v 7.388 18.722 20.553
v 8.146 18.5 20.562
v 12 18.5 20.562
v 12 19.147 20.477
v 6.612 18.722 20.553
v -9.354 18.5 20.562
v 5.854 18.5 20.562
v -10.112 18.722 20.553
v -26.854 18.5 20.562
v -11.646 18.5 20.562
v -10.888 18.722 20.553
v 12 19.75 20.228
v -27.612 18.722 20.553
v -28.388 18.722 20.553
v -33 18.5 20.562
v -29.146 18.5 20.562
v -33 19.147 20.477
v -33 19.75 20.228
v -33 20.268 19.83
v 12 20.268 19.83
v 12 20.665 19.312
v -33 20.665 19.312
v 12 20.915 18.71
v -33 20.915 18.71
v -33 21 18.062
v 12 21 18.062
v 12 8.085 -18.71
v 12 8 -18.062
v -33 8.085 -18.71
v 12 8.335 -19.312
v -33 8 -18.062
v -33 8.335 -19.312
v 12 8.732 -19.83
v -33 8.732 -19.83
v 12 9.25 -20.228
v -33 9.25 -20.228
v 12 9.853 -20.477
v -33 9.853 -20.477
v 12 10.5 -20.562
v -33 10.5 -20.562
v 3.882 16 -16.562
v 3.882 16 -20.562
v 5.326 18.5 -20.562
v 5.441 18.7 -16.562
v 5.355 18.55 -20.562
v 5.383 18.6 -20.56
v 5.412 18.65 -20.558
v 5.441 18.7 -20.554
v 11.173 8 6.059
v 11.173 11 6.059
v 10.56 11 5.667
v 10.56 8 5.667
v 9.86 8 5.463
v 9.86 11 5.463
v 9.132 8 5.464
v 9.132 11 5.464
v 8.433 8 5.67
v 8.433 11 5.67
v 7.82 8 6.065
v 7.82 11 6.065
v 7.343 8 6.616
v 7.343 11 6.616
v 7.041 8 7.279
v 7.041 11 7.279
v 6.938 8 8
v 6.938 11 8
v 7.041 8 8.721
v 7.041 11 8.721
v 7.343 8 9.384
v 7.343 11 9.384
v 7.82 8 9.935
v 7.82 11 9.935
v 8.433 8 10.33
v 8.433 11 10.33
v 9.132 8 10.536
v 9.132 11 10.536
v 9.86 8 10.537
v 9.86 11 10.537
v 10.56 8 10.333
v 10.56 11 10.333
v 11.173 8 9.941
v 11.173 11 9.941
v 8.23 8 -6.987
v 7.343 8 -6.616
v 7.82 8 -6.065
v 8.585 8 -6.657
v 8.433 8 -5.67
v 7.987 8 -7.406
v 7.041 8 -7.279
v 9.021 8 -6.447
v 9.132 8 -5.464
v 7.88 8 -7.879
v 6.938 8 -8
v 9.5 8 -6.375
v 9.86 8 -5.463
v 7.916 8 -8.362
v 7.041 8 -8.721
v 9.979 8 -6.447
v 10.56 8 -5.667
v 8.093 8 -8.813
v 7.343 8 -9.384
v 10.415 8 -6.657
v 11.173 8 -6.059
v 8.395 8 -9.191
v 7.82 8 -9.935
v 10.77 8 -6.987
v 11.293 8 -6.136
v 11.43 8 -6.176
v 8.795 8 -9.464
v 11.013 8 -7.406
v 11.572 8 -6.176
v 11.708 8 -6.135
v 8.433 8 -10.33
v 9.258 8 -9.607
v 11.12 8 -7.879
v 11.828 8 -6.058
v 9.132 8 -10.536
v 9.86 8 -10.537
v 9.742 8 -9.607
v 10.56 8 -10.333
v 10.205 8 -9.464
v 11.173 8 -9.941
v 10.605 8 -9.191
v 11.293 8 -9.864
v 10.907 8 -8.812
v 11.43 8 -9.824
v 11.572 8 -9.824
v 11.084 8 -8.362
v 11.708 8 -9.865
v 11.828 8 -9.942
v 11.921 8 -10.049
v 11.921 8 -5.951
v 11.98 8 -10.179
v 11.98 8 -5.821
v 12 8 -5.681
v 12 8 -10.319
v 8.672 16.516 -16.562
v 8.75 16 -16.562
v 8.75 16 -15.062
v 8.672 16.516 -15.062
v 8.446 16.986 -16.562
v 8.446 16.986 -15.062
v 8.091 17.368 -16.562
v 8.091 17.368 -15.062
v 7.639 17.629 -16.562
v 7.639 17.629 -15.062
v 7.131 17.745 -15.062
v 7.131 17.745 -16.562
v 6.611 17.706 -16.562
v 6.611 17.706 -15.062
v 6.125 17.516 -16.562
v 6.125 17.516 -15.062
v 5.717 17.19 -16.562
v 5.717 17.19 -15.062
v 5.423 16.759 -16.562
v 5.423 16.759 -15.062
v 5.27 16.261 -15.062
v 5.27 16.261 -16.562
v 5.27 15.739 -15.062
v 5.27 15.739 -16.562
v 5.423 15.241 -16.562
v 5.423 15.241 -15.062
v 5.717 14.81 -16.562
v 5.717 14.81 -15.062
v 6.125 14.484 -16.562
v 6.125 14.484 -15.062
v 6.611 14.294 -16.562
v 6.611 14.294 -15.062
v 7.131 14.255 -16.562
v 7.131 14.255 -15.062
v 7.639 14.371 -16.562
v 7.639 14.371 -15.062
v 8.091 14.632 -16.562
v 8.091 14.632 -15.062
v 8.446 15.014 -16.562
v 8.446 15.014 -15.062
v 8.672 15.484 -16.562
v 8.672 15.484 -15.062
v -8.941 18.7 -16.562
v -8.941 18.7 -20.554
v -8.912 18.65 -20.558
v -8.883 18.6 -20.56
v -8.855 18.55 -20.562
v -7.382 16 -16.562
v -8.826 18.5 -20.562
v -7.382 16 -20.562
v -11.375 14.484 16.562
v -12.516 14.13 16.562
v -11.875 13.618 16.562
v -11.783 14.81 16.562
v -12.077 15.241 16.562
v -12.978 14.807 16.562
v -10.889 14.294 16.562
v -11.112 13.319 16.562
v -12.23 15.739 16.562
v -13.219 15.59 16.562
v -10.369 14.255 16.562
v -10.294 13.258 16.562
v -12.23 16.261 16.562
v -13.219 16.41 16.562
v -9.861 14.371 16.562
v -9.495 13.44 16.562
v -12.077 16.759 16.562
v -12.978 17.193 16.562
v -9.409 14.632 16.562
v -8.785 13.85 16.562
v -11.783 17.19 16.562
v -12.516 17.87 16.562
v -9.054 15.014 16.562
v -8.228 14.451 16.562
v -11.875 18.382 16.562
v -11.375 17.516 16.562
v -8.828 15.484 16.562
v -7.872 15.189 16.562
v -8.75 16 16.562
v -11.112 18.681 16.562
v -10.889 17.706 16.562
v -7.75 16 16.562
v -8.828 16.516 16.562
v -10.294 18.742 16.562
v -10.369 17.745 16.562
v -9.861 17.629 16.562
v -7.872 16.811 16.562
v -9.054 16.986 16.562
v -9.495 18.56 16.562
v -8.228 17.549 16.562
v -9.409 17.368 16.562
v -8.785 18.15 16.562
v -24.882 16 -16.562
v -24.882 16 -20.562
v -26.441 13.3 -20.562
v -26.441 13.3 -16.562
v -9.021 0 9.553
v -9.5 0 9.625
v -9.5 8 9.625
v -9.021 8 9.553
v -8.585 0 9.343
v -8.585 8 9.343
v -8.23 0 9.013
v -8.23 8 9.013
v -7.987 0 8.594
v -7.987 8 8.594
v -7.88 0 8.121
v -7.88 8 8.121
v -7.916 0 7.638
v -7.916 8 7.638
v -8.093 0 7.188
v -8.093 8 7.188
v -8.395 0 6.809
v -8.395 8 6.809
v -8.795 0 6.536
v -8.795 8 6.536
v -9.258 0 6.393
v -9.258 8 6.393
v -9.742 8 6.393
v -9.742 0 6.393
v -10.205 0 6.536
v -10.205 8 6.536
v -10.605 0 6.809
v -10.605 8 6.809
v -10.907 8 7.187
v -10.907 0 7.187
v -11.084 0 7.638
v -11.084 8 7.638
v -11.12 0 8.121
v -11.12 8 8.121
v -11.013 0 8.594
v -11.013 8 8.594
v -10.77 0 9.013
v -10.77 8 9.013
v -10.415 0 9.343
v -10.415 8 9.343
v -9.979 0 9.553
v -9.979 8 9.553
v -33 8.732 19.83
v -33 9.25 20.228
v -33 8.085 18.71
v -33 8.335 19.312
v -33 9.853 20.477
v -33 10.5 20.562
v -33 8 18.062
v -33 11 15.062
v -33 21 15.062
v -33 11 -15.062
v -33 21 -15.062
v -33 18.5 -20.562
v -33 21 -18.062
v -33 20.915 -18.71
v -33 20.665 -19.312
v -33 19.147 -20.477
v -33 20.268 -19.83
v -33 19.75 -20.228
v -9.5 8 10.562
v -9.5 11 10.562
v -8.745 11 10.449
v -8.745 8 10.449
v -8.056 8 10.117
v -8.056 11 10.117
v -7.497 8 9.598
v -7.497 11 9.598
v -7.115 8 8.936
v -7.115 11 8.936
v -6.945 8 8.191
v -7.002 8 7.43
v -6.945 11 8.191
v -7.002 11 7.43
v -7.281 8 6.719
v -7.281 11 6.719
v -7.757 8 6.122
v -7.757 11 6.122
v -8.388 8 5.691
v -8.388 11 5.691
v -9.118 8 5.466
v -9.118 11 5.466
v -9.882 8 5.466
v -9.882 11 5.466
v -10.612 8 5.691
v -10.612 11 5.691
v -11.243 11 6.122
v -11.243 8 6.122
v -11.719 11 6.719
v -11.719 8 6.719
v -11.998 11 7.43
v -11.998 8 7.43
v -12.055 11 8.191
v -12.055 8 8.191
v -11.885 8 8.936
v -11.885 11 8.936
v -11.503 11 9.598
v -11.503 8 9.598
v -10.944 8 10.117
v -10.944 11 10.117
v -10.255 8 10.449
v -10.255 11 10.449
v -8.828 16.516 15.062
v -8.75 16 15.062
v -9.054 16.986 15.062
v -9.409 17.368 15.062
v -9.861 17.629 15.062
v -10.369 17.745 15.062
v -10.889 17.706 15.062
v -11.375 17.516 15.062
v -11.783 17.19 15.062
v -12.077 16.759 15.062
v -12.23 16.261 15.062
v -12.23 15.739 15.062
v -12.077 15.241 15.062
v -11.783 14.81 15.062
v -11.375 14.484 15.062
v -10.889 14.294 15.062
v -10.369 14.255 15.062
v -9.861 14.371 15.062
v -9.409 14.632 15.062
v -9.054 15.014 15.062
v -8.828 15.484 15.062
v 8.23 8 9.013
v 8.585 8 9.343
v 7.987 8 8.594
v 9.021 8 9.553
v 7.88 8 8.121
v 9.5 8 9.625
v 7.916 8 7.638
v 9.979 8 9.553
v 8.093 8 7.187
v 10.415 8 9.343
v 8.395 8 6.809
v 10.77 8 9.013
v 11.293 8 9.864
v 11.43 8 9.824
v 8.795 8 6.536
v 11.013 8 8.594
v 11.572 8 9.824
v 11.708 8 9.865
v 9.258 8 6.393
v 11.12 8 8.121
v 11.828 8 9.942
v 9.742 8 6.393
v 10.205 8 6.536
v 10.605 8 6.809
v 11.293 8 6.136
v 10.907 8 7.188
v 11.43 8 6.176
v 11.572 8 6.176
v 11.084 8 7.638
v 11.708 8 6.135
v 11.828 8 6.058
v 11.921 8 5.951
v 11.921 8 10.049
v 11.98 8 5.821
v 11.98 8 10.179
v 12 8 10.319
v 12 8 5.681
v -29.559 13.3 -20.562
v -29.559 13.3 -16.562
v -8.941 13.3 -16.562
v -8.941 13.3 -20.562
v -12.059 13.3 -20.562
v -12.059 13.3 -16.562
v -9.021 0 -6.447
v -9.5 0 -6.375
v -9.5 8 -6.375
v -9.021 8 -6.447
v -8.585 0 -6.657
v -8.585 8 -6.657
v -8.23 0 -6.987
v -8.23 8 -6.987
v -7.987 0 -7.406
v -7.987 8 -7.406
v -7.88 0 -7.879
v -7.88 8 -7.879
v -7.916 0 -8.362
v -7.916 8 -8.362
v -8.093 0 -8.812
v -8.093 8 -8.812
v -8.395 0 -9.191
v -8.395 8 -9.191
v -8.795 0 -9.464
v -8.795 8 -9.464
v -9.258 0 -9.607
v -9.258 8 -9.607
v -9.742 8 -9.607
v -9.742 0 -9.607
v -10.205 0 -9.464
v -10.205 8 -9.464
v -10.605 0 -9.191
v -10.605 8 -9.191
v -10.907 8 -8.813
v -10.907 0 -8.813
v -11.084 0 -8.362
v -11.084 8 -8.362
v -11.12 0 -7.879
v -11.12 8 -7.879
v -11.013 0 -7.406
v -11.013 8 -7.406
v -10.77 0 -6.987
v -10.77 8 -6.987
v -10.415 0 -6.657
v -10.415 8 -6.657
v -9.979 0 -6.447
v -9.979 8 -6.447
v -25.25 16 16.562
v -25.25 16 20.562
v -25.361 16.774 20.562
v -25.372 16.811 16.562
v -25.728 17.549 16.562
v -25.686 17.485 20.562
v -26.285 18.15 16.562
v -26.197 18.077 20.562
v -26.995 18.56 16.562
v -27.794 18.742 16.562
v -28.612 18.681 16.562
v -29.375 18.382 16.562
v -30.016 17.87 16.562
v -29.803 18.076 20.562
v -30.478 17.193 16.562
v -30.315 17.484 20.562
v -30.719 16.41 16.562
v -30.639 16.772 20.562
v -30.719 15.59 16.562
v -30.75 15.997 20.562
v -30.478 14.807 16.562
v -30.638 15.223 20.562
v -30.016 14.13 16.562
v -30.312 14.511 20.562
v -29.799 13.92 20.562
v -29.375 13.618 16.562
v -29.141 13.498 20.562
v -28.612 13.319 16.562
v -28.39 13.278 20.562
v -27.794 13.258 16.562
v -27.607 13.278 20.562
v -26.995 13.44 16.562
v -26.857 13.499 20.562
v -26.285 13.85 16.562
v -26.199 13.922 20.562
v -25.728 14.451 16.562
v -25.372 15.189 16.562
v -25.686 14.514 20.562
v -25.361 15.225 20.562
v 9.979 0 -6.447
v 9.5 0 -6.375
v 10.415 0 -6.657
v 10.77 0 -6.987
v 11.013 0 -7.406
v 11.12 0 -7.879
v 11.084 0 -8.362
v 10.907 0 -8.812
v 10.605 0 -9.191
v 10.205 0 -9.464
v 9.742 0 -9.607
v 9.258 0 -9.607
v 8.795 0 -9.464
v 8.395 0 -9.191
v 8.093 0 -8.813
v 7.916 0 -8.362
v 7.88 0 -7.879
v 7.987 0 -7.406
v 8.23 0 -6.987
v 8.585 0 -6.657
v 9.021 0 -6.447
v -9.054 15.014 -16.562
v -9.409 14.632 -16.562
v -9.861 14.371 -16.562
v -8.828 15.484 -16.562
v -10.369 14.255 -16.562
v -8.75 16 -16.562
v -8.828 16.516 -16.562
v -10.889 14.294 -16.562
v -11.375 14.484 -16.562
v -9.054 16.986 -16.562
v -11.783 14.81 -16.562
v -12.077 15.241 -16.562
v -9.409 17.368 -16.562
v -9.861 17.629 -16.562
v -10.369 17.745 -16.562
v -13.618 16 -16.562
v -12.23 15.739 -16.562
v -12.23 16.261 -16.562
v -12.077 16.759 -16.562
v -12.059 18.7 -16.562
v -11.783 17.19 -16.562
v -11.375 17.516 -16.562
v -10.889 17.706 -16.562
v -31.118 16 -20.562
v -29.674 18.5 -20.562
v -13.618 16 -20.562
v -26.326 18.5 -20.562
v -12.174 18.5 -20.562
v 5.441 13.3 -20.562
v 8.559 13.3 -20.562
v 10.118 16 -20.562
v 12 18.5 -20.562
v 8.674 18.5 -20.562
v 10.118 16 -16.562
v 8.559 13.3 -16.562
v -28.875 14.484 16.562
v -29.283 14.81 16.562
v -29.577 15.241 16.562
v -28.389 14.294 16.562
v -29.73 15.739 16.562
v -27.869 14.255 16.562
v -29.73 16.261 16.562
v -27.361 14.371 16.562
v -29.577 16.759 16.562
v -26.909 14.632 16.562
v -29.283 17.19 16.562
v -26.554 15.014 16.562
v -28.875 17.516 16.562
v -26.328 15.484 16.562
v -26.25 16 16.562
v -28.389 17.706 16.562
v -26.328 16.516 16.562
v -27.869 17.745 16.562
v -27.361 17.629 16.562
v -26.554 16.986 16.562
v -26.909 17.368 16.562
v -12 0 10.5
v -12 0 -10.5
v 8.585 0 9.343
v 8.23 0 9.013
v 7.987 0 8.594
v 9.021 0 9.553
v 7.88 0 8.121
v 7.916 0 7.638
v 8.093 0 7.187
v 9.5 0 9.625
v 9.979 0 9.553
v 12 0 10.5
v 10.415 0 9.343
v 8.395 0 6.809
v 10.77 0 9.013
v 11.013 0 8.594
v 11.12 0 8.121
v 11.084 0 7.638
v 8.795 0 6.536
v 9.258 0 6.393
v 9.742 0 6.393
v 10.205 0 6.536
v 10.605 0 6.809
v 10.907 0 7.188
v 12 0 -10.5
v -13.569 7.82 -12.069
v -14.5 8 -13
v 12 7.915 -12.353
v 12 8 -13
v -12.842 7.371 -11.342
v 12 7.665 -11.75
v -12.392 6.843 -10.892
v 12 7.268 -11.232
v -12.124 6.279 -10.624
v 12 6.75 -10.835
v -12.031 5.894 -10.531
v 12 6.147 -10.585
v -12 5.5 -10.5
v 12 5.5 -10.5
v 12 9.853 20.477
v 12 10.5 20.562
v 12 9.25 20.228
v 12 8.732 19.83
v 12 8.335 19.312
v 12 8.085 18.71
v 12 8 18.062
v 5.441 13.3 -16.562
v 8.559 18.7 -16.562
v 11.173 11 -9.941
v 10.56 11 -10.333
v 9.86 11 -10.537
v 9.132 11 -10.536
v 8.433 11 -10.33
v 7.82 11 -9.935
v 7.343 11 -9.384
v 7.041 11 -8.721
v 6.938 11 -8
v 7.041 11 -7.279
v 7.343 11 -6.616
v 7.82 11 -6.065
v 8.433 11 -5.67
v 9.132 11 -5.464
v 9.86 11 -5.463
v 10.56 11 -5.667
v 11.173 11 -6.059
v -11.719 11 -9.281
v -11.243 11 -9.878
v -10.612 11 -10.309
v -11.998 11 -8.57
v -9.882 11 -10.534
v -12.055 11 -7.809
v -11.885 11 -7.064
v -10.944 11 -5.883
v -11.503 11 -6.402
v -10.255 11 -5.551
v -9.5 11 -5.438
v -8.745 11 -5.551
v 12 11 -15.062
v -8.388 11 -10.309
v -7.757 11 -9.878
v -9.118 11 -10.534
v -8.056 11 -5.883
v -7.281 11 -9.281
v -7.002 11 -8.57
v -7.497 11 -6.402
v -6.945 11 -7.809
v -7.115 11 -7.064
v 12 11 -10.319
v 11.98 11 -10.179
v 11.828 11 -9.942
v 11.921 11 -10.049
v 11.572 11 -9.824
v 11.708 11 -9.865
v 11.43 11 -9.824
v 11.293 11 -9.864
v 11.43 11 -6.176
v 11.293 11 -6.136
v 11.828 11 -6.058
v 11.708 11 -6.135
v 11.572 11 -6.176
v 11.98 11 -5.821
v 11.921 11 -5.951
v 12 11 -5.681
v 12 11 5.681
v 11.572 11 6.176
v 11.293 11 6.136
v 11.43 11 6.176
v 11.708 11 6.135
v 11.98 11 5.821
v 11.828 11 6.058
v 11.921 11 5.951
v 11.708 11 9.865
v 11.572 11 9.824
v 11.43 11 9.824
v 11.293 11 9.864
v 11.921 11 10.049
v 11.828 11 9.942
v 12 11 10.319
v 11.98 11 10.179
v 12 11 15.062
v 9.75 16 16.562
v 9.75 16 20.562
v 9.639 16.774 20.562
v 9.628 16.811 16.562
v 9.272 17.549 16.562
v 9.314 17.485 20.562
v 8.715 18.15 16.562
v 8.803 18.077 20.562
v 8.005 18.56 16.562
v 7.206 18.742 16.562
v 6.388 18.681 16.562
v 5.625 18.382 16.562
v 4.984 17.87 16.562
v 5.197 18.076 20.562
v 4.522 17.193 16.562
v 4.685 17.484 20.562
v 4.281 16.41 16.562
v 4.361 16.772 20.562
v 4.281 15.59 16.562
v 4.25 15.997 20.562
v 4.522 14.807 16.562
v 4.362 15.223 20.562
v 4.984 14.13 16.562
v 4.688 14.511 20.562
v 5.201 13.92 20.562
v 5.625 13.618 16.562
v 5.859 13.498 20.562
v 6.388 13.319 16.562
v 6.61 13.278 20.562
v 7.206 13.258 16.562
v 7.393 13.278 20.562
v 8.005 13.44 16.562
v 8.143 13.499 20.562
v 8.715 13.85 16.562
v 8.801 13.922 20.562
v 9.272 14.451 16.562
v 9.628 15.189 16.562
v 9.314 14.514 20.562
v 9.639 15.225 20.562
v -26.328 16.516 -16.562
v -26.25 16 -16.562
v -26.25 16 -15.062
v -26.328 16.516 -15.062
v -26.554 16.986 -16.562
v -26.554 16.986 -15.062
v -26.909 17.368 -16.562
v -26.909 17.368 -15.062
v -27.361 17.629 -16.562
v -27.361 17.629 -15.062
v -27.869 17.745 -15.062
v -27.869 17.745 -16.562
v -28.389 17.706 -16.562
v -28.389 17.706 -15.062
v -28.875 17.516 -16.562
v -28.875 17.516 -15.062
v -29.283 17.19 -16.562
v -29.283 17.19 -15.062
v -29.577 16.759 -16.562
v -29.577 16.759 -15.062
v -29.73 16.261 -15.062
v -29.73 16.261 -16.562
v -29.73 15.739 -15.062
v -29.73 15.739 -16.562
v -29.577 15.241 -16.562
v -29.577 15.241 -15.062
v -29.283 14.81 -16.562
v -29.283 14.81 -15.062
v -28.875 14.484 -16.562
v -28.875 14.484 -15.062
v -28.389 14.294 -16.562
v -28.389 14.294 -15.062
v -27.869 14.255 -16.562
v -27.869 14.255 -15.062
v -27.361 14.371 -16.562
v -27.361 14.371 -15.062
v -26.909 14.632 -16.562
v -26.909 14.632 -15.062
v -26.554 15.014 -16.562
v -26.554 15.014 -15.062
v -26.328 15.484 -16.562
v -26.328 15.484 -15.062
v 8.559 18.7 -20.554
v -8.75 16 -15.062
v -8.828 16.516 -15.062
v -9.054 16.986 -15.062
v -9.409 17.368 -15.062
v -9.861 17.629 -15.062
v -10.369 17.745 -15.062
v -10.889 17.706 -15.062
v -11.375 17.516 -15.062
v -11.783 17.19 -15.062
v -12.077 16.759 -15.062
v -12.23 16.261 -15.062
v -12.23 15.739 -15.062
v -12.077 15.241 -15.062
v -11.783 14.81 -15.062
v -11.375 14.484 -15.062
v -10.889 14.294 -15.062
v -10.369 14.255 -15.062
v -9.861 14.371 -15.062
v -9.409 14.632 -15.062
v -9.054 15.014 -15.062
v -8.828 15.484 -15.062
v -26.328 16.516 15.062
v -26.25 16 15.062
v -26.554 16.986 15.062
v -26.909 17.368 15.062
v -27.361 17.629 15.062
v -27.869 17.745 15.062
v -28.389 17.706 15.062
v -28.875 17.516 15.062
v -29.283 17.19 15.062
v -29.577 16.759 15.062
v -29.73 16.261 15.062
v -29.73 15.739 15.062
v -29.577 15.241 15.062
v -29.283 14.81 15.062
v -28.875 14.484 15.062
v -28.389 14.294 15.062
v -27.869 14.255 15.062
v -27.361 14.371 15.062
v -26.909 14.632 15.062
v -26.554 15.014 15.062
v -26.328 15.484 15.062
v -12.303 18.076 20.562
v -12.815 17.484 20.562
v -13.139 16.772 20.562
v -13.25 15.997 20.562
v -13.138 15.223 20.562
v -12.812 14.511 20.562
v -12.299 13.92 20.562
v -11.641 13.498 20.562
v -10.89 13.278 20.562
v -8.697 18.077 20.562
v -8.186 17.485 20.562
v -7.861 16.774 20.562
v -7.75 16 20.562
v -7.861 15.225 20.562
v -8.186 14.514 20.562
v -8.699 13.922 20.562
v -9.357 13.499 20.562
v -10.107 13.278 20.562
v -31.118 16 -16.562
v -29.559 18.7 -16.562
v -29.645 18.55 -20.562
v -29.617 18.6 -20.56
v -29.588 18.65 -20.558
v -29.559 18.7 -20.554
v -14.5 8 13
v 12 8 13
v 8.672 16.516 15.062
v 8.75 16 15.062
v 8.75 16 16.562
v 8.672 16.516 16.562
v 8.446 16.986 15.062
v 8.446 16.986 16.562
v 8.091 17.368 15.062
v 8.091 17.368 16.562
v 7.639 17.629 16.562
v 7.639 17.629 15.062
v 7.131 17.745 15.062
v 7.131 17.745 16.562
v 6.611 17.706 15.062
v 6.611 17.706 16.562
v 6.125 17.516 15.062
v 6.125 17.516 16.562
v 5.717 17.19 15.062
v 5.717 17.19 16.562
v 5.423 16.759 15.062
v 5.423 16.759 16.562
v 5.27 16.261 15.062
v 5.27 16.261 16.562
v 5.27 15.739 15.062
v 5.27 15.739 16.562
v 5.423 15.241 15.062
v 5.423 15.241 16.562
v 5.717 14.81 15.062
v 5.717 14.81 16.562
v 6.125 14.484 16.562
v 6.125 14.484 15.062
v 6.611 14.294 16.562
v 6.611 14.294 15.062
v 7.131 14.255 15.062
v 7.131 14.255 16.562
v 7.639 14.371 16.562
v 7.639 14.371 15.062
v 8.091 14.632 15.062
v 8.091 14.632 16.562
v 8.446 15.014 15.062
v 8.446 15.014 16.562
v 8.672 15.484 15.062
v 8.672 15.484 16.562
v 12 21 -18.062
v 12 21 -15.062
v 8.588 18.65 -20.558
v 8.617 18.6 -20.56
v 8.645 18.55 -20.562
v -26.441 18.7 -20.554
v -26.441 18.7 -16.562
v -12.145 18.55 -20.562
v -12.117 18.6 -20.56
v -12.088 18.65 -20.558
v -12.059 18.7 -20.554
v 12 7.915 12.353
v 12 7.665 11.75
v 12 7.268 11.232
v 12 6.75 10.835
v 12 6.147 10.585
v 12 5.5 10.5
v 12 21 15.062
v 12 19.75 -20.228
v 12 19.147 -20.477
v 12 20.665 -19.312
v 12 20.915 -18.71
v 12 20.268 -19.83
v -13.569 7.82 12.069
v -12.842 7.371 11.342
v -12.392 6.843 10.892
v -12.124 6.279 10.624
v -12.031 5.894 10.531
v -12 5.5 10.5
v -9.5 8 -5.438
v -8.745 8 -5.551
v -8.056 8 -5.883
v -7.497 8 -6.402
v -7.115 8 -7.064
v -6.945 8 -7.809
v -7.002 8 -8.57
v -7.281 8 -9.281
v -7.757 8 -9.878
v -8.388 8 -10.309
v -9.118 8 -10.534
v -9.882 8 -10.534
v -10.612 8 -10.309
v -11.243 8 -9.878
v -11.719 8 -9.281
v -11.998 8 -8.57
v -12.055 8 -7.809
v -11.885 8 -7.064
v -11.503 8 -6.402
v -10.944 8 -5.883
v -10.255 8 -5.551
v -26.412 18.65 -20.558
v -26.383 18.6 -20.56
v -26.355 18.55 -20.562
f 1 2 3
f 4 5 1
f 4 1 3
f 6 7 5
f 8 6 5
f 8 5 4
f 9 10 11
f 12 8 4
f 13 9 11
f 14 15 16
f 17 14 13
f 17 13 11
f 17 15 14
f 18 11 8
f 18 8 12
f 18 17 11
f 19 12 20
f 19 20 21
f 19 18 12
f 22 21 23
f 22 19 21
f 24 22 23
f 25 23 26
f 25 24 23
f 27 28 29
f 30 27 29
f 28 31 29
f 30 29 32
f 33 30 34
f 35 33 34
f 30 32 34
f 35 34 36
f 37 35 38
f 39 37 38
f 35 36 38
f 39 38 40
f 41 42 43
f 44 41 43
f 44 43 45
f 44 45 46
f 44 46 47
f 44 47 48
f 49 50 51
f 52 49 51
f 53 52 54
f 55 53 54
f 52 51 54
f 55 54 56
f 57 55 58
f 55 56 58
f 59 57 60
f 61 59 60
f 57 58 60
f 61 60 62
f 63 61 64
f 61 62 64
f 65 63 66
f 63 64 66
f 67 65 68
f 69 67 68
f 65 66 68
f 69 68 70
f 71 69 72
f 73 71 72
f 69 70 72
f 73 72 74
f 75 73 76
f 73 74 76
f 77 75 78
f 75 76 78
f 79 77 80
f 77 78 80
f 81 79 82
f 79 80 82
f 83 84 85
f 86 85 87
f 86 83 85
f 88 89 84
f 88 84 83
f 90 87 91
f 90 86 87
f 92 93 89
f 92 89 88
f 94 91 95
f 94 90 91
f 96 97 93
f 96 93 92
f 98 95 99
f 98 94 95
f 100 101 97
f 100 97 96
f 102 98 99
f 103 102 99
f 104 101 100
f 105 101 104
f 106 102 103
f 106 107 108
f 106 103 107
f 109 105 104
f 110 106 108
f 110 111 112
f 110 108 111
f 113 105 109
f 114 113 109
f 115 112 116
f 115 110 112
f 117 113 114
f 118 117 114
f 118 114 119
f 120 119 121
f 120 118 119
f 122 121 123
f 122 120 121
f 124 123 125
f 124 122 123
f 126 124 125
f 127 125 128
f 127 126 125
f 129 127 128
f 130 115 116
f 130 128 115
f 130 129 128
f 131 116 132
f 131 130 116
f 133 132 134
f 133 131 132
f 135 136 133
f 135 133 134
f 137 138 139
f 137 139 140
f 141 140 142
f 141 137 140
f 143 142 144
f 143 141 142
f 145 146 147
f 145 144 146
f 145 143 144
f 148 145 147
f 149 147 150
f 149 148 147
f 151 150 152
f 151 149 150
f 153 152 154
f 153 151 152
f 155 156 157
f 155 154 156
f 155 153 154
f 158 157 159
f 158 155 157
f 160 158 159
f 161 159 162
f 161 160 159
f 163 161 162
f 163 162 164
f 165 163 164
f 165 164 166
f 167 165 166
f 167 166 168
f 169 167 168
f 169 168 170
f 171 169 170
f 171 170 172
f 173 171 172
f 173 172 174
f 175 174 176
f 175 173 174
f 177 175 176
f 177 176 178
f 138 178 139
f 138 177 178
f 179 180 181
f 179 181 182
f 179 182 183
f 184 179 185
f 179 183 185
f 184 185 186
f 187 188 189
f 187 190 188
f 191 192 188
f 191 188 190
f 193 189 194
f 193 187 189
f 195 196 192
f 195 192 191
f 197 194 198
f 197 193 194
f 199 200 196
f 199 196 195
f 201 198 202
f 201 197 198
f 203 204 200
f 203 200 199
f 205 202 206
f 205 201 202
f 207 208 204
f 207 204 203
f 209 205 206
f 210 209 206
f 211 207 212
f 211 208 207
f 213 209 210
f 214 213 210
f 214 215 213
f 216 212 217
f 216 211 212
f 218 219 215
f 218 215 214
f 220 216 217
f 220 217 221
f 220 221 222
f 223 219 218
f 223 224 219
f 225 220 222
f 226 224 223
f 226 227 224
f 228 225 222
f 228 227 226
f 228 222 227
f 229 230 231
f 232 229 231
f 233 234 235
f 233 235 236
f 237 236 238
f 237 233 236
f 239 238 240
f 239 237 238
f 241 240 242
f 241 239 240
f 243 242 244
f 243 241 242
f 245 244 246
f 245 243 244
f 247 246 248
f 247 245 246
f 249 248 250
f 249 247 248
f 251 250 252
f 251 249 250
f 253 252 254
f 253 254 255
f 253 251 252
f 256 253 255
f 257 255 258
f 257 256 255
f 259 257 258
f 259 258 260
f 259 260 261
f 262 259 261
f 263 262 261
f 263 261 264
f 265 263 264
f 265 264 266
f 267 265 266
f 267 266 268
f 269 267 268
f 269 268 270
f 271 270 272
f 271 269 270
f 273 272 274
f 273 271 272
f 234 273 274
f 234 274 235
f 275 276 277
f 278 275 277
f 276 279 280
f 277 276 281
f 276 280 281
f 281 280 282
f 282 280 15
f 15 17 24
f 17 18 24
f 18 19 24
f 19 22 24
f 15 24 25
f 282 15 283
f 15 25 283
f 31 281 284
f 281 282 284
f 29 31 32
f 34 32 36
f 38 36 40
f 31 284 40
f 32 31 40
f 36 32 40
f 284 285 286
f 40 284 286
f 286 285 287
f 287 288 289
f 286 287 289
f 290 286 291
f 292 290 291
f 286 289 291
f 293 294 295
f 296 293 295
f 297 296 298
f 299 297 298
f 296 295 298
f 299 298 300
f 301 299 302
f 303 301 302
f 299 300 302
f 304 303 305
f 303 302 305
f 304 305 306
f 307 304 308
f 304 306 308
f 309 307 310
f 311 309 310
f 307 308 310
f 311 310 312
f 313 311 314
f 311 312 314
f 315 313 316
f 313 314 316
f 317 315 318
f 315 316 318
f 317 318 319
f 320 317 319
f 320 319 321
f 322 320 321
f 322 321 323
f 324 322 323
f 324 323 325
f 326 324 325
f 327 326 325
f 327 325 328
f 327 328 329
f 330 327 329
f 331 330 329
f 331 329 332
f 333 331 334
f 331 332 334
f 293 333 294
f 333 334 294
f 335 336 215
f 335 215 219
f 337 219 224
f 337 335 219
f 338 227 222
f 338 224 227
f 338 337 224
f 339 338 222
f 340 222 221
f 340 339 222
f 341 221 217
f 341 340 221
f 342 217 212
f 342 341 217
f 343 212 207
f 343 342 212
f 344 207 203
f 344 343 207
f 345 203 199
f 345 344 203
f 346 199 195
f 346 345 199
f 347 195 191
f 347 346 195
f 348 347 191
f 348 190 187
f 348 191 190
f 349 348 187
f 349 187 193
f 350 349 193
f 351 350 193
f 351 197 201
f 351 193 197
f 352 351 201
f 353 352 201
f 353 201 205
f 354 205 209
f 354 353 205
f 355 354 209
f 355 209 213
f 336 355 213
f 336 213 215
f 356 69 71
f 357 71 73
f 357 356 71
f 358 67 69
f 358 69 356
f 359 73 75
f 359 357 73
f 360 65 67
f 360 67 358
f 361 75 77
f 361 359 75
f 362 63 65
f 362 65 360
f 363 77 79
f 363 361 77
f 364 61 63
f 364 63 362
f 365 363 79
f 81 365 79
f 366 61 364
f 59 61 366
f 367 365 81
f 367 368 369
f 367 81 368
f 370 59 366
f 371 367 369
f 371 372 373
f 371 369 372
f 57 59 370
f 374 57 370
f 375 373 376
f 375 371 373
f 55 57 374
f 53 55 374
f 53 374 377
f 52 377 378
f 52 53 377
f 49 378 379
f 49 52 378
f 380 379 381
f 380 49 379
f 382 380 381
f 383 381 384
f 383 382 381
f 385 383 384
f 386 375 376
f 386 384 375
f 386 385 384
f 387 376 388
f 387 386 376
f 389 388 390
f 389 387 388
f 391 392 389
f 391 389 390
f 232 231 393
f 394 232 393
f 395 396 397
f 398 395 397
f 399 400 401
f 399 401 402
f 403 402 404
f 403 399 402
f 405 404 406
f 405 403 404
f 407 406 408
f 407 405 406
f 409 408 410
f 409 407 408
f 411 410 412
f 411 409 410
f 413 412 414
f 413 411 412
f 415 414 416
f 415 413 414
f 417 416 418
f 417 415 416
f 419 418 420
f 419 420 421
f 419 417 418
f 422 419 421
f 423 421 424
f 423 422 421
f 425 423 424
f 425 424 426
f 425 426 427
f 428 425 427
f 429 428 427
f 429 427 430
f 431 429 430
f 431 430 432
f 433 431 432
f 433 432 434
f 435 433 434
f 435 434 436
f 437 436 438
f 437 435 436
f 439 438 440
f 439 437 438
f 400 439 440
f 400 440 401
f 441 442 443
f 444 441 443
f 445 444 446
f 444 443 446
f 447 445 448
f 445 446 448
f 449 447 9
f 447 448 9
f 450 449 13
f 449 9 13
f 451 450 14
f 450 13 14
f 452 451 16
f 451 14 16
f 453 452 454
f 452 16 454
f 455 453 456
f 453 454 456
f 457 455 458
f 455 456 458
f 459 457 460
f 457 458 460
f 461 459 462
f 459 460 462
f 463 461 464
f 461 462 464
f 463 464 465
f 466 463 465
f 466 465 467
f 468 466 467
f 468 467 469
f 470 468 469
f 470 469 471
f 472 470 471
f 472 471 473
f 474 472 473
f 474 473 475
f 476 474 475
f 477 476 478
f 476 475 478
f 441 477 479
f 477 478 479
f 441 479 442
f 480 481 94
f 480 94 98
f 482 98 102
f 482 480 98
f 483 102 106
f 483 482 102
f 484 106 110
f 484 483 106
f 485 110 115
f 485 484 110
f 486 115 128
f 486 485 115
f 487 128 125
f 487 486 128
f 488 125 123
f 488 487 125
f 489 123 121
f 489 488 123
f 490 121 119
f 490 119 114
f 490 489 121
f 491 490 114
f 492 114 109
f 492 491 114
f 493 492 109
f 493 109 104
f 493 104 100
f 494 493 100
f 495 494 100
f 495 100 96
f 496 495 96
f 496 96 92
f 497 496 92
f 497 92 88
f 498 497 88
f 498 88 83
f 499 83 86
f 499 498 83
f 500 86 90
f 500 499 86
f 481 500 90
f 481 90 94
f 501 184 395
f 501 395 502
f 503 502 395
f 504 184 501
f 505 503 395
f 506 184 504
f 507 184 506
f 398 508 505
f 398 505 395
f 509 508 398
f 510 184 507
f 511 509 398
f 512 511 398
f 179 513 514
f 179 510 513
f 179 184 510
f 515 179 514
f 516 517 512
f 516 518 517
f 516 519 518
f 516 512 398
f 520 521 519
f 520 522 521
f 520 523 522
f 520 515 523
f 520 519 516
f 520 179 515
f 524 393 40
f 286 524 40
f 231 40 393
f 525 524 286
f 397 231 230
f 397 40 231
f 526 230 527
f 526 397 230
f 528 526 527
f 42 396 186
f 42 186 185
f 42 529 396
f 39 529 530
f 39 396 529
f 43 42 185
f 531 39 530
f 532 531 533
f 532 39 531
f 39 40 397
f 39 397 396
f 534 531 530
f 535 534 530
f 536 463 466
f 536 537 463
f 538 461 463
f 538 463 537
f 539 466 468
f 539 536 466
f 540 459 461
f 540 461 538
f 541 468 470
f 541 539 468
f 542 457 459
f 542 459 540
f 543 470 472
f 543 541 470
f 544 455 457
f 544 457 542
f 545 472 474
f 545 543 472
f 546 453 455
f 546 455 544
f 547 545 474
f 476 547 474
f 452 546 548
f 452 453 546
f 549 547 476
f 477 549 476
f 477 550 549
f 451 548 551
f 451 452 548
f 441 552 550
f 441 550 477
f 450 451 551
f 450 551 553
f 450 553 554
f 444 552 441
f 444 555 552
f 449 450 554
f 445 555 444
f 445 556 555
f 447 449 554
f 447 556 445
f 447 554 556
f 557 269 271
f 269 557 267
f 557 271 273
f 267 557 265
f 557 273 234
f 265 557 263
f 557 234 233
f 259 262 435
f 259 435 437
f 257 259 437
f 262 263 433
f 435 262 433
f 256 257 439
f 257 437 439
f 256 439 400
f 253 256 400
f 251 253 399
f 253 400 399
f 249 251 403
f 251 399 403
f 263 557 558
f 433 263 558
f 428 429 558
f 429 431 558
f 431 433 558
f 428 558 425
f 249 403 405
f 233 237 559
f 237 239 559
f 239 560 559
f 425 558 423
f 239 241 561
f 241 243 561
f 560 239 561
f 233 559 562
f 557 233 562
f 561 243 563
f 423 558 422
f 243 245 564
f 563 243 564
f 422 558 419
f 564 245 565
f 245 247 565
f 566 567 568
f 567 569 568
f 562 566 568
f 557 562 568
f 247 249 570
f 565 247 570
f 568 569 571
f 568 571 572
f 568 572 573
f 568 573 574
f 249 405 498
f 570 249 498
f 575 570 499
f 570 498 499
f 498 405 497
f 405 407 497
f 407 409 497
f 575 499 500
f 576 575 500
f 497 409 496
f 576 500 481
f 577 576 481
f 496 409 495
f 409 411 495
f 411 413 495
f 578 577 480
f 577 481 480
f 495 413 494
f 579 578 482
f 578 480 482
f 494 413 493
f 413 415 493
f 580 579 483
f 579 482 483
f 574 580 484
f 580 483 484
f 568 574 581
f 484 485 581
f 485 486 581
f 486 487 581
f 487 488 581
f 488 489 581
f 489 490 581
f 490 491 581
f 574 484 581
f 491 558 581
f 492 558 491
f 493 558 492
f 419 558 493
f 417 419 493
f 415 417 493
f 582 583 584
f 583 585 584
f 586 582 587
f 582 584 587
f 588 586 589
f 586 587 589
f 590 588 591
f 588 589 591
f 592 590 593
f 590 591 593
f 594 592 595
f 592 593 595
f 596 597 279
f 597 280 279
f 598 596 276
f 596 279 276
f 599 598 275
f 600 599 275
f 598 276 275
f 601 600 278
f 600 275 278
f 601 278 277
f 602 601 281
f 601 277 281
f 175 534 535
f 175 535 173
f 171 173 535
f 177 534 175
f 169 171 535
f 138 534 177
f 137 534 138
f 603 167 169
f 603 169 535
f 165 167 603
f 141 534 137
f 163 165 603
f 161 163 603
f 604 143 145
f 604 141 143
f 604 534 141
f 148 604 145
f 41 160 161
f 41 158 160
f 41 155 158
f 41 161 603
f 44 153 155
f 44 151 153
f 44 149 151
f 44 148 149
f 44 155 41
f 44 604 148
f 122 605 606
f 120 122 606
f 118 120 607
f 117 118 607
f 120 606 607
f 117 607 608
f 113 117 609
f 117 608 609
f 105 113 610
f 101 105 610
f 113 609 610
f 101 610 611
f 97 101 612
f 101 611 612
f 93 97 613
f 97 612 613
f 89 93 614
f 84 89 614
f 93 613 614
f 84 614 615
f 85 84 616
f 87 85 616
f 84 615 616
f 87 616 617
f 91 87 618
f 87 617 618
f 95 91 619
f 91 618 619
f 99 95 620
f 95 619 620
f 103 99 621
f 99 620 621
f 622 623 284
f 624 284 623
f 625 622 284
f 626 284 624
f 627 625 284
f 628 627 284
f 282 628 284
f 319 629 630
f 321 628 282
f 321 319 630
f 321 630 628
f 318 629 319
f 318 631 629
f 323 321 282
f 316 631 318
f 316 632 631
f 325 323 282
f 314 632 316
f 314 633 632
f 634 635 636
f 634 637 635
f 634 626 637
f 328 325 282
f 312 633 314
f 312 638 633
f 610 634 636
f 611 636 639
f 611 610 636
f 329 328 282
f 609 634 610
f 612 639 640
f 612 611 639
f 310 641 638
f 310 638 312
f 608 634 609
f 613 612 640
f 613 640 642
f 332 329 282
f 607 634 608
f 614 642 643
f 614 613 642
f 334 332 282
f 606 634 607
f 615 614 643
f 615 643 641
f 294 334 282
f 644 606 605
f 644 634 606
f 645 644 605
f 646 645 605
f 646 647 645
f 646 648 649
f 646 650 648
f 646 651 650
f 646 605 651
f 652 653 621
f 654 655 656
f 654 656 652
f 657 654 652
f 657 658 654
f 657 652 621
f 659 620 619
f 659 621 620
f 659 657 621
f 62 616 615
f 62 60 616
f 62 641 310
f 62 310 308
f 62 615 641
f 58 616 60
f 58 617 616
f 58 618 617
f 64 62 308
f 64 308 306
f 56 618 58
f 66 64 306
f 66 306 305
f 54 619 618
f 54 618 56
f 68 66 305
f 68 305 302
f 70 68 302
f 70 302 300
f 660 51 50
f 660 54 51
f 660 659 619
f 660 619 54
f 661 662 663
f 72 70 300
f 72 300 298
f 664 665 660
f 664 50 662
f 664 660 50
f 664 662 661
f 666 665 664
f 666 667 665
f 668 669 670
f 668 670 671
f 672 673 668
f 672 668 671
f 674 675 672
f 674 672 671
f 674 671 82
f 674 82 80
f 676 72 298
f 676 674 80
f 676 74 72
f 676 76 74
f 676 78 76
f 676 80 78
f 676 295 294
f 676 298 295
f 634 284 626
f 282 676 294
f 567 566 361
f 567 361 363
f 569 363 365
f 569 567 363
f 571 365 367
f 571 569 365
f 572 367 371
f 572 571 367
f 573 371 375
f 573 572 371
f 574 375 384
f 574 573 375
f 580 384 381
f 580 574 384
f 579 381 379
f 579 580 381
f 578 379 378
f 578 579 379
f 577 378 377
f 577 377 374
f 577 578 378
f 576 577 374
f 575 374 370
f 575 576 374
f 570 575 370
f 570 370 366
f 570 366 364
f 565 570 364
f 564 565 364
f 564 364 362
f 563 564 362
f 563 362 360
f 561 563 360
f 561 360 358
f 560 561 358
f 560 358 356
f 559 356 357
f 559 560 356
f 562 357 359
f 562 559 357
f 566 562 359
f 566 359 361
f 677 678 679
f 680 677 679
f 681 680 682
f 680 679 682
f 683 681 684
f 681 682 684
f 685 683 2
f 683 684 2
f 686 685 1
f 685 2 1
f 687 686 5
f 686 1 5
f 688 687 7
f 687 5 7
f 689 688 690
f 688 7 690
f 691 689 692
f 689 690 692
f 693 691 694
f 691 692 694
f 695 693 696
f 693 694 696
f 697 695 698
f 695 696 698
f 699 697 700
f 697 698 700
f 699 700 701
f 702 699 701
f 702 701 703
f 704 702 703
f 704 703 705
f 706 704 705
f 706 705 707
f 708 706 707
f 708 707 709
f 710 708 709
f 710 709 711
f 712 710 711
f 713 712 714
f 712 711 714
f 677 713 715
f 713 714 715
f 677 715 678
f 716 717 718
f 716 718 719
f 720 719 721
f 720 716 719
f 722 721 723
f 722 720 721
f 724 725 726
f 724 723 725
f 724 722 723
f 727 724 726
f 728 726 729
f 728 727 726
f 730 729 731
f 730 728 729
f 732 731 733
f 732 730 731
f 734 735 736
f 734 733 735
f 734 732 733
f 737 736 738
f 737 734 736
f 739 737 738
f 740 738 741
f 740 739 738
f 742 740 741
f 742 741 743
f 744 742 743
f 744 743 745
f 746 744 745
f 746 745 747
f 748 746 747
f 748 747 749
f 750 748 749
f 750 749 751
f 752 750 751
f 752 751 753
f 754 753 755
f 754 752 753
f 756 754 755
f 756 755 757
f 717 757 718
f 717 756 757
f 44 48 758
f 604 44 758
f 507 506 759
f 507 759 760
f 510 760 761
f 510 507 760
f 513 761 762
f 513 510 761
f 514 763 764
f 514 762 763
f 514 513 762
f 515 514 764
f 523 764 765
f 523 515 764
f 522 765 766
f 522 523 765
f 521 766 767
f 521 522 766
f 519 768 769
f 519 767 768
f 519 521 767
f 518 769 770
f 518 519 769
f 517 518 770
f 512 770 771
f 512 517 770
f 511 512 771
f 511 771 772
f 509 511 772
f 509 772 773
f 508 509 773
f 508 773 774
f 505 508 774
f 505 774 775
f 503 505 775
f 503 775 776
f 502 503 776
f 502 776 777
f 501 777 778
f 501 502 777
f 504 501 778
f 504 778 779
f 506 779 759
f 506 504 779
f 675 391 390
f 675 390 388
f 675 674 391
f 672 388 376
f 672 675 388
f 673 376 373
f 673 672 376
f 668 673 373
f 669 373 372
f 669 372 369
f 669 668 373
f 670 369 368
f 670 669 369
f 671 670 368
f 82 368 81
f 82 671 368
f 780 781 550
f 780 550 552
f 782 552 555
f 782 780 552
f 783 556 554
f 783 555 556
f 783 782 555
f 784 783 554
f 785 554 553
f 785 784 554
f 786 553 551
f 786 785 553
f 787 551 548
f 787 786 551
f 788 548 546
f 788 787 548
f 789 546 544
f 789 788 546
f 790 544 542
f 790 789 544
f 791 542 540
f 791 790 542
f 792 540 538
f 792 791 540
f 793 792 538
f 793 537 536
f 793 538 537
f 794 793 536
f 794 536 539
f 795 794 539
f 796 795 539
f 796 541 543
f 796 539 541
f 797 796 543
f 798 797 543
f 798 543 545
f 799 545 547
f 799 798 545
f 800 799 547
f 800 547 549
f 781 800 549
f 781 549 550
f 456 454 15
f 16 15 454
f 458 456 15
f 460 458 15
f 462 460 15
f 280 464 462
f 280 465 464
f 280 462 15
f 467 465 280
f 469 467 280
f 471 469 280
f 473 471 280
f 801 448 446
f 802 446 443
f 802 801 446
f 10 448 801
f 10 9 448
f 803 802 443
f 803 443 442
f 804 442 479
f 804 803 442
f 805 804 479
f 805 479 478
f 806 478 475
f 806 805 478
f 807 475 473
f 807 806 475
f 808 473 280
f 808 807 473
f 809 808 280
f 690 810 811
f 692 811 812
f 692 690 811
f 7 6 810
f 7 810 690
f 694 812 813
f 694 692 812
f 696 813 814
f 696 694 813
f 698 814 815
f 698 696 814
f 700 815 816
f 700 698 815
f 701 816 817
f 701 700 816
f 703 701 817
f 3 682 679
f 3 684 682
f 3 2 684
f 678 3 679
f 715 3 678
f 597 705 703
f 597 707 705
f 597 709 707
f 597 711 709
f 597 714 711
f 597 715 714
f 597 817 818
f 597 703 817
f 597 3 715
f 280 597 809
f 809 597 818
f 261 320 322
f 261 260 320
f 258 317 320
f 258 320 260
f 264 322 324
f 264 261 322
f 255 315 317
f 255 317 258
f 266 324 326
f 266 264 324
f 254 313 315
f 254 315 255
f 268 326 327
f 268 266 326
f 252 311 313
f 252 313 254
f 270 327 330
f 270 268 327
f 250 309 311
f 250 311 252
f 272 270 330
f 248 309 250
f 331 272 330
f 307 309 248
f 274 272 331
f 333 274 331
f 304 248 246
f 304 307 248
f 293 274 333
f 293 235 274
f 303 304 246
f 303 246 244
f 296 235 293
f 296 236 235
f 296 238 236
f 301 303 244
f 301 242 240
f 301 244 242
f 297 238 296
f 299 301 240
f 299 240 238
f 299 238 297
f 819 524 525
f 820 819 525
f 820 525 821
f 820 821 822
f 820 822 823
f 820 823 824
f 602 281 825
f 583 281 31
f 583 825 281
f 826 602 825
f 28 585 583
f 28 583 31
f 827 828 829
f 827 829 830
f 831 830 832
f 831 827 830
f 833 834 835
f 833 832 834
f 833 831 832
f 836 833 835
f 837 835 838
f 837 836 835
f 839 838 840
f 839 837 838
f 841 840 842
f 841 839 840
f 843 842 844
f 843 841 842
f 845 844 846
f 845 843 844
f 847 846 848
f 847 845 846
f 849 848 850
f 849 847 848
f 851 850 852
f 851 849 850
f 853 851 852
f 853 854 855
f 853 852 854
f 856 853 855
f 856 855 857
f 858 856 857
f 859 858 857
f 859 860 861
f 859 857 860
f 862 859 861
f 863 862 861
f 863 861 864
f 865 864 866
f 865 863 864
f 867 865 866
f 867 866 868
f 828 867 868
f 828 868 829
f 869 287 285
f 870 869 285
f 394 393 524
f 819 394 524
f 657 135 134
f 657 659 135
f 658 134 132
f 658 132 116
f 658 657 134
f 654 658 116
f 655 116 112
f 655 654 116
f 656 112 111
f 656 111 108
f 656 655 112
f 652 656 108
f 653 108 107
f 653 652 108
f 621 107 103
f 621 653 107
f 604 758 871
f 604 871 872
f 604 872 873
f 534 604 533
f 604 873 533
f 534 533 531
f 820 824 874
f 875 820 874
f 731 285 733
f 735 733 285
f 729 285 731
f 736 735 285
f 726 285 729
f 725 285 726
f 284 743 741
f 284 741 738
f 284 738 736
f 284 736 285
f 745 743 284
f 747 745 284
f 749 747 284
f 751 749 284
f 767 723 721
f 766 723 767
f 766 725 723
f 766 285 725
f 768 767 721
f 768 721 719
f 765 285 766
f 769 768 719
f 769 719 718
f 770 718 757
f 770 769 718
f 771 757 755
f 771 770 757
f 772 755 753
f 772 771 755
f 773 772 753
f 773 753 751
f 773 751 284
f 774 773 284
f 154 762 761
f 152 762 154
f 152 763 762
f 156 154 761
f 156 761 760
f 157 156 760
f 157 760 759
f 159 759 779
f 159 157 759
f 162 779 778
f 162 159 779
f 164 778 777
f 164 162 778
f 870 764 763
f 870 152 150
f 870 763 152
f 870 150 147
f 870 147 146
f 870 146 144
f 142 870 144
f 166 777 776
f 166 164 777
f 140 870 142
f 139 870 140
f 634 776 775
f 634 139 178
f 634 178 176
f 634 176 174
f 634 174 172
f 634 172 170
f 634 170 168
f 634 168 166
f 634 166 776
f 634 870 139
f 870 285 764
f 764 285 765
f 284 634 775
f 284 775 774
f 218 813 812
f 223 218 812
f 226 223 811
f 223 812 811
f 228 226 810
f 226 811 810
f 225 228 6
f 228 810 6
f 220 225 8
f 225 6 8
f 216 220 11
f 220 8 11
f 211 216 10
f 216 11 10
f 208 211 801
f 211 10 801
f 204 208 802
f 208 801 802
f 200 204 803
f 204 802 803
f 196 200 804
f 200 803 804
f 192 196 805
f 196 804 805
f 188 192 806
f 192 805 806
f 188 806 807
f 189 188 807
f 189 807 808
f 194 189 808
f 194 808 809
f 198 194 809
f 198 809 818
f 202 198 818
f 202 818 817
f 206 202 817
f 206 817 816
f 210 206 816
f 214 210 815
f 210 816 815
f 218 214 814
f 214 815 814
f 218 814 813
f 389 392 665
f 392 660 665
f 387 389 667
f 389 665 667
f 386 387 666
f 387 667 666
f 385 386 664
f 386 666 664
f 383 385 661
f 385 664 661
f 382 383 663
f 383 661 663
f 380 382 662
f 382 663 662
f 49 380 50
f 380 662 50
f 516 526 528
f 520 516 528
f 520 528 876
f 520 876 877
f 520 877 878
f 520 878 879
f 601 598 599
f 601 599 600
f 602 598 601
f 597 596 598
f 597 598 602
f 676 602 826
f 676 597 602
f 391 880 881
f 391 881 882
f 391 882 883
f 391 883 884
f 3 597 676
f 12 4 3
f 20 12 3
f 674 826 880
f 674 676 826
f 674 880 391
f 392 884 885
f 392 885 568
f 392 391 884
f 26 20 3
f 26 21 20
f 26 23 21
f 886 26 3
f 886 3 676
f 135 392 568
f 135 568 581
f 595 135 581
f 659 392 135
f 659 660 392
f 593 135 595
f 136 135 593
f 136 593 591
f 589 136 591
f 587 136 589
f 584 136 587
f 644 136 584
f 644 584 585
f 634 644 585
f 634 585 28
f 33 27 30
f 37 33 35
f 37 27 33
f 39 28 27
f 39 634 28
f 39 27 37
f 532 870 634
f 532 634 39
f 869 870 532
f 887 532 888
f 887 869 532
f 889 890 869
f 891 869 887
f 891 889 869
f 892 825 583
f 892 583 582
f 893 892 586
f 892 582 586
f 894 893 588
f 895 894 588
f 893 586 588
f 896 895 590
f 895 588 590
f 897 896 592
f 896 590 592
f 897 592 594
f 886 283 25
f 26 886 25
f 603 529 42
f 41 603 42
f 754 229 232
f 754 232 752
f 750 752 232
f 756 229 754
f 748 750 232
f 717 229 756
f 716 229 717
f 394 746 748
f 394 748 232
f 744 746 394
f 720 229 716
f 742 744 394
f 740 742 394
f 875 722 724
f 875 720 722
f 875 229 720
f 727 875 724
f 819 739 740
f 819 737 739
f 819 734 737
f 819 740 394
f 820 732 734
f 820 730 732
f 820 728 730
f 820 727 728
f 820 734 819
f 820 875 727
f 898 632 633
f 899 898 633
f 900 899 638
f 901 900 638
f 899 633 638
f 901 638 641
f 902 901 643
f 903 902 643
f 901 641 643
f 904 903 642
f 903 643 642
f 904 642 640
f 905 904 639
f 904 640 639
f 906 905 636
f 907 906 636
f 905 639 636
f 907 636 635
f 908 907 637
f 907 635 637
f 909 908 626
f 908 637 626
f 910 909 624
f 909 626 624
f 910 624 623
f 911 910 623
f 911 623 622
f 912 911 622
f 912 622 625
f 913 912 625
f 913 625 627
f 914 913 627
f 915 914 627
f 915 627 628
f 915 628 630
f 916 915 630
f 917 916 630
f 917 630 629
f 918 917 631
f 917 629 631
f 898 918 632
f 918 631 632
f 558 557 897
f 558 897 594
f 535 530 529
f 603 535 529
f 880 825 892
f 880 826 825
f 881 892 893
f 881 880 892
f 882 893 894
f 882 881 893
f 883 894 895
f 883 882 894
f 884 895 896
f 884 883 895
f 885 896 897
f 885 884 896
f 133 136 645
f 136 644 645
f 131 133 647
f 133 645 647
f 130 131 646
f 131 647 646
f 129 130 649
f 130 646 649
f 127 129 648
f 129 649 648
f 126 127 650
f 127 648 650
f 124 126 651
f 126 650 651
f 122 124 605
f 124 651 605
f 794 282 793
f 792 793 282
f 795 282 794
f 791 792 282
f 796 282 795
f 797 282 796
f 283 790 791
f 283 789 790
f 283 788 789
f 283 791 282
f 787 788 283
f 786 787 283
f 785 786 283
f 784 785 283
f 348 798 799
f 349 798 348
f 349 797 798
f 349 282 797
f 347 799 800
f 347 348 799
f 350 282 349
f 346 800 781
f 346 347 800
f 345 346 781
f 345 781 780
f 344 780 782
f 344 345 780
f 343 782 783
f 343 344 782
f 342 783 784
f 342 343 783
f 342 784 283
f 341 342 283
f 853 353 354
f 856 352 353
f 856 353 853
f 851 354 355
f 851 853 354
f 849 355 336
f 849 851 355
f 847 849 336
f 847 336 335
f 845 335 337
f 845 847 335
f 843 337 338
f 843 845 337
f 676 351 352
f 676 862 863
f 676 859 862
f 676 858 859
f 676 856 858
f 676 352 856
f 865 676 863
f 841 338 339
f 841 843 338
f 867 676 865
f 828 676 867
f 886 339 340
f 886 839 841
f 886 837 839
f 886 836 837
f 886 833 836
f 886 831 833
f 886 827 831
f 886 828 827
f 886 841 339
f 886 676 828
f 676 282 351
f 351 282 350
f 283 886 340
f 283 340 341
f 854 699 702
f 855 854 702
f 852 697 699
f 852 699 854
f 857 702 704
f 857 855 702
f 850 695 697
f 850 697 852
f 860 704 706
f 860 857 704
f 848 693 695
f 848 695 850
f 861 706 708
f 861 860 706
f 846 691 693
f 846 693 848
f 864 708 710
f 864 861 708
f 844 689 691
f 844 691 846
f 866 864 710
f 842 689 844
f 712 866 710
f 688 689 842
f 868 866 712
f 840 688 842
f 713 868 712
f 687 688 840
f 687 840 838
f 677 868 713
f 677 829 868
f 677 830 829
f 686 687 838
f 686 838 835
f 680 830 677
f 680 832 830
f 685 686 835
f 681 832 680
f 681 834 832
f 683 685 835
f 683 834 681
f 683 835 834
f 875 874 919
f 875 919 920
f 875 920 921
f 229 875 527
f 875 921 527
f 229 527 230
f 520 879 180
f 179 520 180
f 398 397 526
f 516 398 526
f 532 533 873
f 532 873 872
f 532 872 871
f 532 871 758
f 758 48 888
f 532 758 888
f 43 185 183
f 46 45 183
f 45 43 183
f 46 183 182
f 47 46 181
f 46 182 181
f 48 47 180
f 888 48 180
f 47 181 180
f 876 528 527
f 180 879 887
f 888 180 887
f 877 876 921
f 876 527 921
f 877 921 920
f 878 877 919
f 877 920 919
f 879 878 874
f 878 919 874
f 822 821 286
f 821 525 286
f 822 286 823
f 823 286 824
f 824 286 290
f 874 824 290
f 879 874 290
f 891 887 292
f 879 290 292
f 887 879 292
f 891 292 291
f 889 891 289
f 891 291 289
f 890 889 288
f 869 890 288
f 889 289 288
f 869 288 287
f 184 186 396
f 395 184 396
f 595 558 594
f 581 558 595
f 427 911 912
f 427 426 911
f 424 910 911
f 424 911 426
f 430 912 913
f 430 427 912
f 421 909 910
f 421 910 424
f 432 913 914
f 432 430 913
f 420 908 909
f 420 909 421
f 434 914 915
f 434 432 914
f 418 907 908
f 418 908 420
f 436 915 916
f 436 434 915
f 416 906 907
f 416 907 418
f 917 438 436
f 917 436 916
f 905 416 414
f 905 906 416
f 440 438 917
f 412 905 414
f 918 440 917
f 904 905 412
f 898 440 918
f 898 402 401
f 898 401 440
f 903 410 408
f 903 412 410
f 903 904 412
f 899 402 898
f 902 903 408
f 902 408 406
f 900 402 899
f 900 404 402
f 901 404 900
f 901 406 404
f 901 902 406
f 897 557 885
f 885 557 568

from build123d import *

# Parameters (mm, degrees)
SKETCH1_W               = 24
SKETCH1_H               = 21
SKETCH1_R               = 1.625
BOSS_EXTRUDE1_DEPTH     = 8
BOSS_EXTRUDE4_DEPTH     = 45
CUT_EXTRUDE9_DEPTH      = 57.756194596
CUT_EXTRUDE9_DEPTH_BACK = 57.756194596
SKETCH15_R              = 1.75
FILLET3_R               = 2.5
SKETCH4_R               = 2.5625
CUT_EXTRUDE3_DEPTH      = 3
FILLET7_R               = 0.5
SKETCH20_R              = 2.75
CUT_EXTRUDE15_DEPTH     = 4
CUT_EXTRUDE16_DEPTH     = 4


with BuildPart() as part:
    # Sketch1 → Boss-Extrude1 (new body)
    with BuildSketch(Plane(origin=(0, 0, 0), x_dir=(1, 0, 0), z_dir=(0, 1, 0))):
        Rectangle(SKETCH1_W, SKETCH1_H)
        with Locations((-9.5, 8)):
            Circle(SKETCH1_R, mode=Mode.SUBTRACT)
        with Locations((9.5, 8)):
            Circle(SKETCH1_R, mode=Mode.SUBTRACT)
        with Locations((9.5, -8)):
            Circle(SKETCH1_R, mode=Mode.SUBTRACT)
        with Locations((-9.5, -8)):
            Circle(SKETCH1_R, mode=Mode.SUBTRACT)
    extrude(amount=BOSS_EXTRUDE1_DEPTH)

    # Sketch7 → Boss-Extrude4 (add)
    with BuildSketch(Plane(origin=(12, 0, 0), x_dir=(0, 0, -1), z_dir=(1, 0, 0))):
        Polygon((-20.5625, 21), (-20.5625, 8), (20.5625, 8), (20.5625, 21), (15.0625, 21), (15.0625, 11), (-15.0625, 11), (-15.0625, 21), align=None)
    extrude(amount=-BOSS_EXTRUDE4_DEPTH)

    # Sketch15 → Cut-Extrude9 (cut, two sides: drawn at the far end of the back side and taken through both)
    with BuildSketch(Plane.XY.offset(20.5625).offset(-CUT_EXTRUDE9_DEPTH_BACK)):
        with Locations((7, 16)):
            Circle(SKETCH15_R)
        with Locations((-10.5, 16)):
            Circle(SKETCH15_R)
        with Locations((-28, 16)):
            Circle(SKETCH15_R)
    extrude(amount=CUT_EXTRUDE9_DEPTH + CUT_EXTRUDE9_DEPTH_BACK, mode=Mode.SUBTRACT)

    # Fillet3
    fillet3_edges = [part.edges().sort_by_distance(p)[0] for p in [
        (0, 8, -10.5),
        (-12, 8, 0),
        (0, 8, 10.5),
        (-10.5, 8, -20.5625),
        (-10.5, 8, 20.5625),
        (-10.5, 21, 20.5625),
        (-10.5, 21, -20.5625),
    ]]
    fillet(fillet3_edges, radius=FILLET3_R)

    # Sketch4 → Cut-Extrude3 (cut)
    with BuildSketch(Plane(origin=(0, 11, 0), x_dir=(1, 0, 0), z_dir=(0, 1, 0))):
        with Locations((-9.5, 8)):
            Circle(SKETCH4_R)
        with Locations((9.5, 8)):
            Circle(SKETCH4_R)
        with Locations((9.5, -8)):
            Circle(SKETCH4_R)
        with Locations((-9.5, -8)):
            Circle(SKETCH4_R)
    extrude(amount=-CUT_EXTRUDE3_DEPTH, mode=Mode.SUBTRACT)

    # Fillet7
    fillet7_edges = [part.edges().sort_by_distance(p)[0] for p in [
        (12, 9.5, -8.5625),
        (12, 9.5, -7.4375),
        (12, 9.5, 7.4375),
        (12, 9.5, 8.5625),
    ]]
    fillet(fillet7_edges, radius=FILLET7_R)

    # Sketch20 → Cut-Extrude15 (cut)
    with BuildSketch(Plane.XY.offset(20.5625)):
        with Locations((-28, 16)):
            Circle(SKETCH20_R)
        with Locations((-10.5, 16)):
            Circle(SKETCH20_R)
        with Locations((7, 16)):
            Circle(SKETCH20_R)
    extrude(amount=-CUT_EXTRUDE15_DEPTH, mode=Mode.SUBTRACT)

    # Sketch21 → Cut-Extrude16 (cut)
    with BuildSketch(Plane(origin=(0, 0, -20.5625), x_dir=(-1, 0, 0), z_dir=(0, 0, -1))):
        Polygon((-5.441154273, 13.3), (-3.882308546, 16), (-5.441154273, 18.7), (-8.558845727, 18.7), (-10.117691454, 16), (-8.558845727, 13.3), align=None)
        Polygon((12.058845727, 13.3), (13.617691454, 16), (12.058845727, 18.7), (8.941154273, 18.7), (7.382308546, 16), (8.941154273, 13.3), align=None)
        Polygon((29.558845727, 13.3), (31.117691454, 16), (29.558845727, 18.7), (26.441154273, 18.7), (24.882308546, 16), (26.441154273, 13.3), align=None)
    extrude(amount=-CUT_EXTRUDE16_DEPTH, mode=Mode.SUBTRACT)


solid = part.part
